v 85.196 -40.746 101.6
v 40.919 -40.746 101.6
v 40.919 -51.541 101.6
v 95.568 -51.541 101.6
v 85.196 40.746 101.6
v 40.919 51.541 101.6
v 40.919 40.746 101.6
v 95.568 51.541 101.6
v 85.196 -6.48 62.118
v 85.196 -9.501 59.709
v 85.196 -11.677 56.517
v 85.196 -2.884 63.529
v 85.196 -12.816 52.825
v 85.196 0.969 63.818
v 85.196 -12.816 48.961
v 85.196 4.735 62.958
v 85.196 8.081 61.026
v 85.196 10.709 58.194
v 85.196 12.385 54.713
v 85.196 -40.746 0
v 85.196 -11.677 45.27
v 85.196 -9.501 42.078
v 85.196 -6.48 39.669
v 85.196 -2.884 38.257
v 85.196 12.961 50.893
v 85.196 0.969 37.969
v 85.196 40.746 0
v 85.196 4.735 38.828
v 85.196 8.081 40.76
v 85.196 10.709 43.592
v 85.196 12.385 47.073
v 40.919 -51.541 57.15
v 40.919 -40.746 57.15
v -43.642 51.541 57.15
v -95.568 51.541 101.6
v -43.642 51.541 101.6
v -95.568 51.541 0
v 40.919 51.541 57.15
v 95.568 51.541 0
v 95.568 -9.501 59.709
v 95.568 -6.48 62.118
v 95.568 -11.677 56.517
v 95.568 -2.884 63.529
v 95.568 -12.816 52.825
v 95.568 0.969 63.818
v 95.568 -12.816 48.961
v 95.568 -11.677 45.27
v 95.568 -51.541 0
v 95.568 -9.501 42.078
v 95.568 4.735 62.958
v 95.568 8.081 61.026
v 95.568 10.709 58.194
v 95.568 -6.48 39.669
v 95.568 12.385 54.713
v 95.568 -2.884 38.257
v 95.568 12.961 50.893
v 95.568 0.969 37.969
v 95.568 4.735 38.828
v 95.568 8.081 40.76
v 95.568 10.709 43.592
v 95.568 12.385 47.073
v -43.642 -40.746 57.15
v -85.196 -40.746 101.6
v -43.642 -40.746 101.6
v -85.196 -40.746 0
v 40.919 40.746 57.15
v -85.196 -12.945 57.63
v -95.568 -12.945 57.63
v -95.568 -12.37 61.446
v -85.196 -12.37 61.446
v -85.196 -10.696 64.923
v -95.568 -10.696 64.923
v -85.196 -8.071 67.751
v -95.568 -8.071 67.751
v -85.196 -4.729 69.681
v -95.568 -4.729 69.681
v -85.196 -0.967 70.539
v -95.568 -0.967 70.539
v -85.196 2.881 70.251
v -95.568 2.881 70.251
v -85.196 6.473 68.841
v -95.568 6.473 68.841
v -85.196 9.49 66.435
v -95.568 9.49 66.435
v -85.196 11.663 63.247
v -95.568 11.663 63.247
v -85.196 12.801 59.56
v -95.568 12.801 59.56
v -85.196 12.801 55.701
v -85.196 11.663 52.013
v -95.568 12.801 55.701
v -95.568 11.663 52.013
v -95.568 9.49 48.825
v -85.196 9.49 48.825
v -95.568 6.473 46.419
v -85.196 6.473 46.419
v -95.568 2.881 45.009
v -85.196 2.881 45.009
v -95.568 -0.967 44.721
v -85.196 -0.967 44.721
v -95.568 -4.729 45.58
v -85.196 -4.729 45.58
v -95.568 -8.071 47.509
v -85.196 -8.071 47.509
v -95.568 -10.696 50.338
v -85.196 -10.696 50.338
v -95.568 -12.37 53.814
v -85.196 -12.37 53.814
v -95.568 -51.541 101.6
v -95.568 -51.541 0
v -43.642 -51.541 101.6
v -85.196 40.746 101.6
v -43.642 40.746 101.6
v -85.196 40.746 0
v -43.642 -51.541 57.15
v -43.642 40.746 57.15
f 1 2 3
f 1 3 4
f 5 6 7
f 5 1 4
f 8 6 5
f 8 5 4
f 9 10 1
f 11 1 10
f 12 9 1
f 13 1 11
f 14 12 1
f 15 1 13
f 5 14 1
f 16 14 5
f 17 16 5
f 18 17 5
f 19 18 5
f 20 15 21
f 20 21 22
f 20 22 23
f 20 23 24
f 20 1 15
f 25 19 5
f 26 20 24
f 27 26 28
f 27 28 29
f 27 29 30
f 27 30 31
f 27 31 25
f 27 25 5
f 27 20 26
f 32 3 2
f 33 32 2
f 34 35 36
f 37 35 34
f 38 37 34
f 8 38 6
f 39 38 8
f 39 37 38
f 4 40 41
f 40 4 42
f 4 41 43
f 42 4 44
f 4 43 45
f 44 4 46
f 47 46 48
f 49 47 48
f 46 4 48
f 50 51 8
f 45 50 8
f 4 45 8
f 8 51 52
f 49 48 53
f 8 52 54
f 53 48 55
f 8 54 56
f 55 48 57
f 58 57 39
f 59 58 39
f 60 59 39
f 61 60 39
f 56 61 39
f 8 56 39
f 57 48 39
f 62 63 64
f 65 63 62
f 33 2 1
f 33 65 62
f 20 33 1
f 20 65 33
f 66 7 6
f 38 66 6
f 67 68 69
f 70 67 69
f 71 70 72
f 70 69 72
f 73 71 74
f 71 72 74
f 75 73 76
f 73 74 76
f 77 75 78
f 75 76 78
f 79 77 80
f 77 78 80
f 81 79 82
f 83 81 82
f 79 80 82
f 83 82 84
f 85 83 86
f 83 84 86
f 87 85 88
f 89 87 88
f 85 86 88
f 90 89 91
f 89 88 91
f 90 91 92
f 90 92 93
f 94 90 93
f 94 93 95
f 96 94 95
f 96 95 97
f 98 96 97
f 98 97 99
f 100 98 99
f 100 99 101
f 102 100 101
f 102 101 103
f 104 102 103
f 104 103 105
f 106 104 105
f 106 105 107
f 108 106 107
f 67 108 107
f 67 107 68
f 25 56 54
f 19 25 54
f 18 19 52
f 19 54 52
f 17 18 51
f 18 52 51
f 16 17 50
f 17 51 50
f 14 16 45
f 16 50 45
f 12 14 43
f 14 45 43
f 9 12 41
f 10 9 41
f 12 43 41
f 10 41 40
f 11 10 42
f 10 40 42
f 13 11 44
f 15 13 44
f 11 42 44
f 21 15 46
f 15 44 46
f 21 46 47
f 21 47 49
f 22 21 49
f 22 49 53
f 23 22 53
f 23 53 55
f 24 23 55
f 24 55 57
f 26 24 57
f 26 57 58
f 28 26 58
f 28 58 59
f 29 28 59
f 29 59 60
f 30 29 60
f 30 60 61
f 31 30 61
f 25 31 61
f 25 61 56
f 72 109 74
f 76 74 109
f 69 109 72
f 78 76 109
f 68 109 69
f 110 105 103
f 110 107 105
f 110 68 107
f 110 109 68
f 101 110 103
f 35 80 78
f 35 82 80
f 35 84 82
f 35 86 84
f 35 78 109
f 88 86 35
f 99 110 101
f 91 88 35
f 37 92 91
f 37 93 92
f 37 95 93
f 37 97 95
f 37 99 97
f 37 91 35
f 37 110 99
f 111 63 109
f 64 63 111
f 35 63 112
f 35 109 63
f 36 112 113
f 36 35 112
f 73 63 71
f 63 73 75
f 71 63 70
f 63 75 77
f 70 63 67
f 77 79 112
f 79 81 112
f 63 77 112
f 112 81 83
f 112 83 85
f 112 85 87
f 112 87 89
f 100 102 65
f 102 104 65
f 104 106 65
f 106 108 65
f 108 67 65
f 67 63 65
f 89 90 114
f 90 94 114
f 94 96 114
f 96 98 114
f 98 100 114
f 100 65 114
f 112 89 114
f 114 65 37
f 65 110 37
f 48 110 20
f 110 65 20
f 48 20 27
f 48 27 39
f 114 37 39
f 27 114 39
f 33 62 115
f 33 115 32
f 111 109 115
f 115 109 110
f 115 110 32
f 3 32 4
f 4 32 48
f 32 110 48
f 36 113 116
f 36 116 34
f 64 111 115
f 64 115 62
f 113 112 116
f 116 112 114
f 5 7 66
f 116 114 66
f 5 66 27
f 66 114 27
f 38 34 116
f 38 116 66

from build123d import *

# Parameters (mm, degrees)
F0_W     = 191.1350041628
F0_H     = 103.0816659331
F0_W_2   = 170.391663909
F0_H_2   = 81.4916715026
F1_DEPTH = 101.6
F2_W     = 84.5615752041
F2_H     = 10.7949972153
F3_DEPTH = 44.45
F4_W     = 84.5615752041
F4_H     = 10.7949972153
F5_DEPTH = 44.45
F6_R     = 12.9453213724
F7_DEPTH = 25.4
F8_R     = 12.9608479871
F9_DEPTH = 25.4


with BuildPart() as f1:
    # F0 (on Top) → F1 (new body)
    with BuildSketch(Plane.XY):
        Rectangle(F0_W, F0_H)
        Rectangle(F0_W_2, F0_H_2, mode=Mode.SUBTRACT)
    extrude(amount=F1_DEPTH)

    # F2 (on face) → F3 (cut)
    with BuildSketch(Plane.XY.offset(101.6)):
        with Locations((-1.3613607734, -46.1433343589)):
            Rectangle(F2_W, F2_H)
    extrude(amount=-F3_DEPTH, mode=Mode.SUBTRACT)

    # F4 (on face) → F5 (cut)
    with BuildSketch(Plane.XY.offset(101.6)):
        with Locations((-1.3613607734, 46.1433343589)):
            Rectangle(F4_W, F4_H)
    extrude(amount=-F5_DEPTH, mode=Mode.SUBTRACT)

    # F6 (on face) → F7 (cut)
    with BuildSketch(Plane(origin=(-95.5675020814, 0, 0), x_dir=(0, -1, 0), z_dir=(-1, 0, 0))):
        with Locations((0, 57.6301626861)):
            Circle(F6_R)
    extrude(amount=-F7_DEPTH, mode=Mode.SUBTRACT)

    # F8 (on face) → F9 (cut)
    with BuildSketch(Plane.YZ.offset(95.5675020814)):
        with Locations((0, 50.8931577206)):
            Circle(F8_R)
    extrude(amount=-F9_DEPTH, mode=Mode.SUBTRACT)


solid = f1.part
